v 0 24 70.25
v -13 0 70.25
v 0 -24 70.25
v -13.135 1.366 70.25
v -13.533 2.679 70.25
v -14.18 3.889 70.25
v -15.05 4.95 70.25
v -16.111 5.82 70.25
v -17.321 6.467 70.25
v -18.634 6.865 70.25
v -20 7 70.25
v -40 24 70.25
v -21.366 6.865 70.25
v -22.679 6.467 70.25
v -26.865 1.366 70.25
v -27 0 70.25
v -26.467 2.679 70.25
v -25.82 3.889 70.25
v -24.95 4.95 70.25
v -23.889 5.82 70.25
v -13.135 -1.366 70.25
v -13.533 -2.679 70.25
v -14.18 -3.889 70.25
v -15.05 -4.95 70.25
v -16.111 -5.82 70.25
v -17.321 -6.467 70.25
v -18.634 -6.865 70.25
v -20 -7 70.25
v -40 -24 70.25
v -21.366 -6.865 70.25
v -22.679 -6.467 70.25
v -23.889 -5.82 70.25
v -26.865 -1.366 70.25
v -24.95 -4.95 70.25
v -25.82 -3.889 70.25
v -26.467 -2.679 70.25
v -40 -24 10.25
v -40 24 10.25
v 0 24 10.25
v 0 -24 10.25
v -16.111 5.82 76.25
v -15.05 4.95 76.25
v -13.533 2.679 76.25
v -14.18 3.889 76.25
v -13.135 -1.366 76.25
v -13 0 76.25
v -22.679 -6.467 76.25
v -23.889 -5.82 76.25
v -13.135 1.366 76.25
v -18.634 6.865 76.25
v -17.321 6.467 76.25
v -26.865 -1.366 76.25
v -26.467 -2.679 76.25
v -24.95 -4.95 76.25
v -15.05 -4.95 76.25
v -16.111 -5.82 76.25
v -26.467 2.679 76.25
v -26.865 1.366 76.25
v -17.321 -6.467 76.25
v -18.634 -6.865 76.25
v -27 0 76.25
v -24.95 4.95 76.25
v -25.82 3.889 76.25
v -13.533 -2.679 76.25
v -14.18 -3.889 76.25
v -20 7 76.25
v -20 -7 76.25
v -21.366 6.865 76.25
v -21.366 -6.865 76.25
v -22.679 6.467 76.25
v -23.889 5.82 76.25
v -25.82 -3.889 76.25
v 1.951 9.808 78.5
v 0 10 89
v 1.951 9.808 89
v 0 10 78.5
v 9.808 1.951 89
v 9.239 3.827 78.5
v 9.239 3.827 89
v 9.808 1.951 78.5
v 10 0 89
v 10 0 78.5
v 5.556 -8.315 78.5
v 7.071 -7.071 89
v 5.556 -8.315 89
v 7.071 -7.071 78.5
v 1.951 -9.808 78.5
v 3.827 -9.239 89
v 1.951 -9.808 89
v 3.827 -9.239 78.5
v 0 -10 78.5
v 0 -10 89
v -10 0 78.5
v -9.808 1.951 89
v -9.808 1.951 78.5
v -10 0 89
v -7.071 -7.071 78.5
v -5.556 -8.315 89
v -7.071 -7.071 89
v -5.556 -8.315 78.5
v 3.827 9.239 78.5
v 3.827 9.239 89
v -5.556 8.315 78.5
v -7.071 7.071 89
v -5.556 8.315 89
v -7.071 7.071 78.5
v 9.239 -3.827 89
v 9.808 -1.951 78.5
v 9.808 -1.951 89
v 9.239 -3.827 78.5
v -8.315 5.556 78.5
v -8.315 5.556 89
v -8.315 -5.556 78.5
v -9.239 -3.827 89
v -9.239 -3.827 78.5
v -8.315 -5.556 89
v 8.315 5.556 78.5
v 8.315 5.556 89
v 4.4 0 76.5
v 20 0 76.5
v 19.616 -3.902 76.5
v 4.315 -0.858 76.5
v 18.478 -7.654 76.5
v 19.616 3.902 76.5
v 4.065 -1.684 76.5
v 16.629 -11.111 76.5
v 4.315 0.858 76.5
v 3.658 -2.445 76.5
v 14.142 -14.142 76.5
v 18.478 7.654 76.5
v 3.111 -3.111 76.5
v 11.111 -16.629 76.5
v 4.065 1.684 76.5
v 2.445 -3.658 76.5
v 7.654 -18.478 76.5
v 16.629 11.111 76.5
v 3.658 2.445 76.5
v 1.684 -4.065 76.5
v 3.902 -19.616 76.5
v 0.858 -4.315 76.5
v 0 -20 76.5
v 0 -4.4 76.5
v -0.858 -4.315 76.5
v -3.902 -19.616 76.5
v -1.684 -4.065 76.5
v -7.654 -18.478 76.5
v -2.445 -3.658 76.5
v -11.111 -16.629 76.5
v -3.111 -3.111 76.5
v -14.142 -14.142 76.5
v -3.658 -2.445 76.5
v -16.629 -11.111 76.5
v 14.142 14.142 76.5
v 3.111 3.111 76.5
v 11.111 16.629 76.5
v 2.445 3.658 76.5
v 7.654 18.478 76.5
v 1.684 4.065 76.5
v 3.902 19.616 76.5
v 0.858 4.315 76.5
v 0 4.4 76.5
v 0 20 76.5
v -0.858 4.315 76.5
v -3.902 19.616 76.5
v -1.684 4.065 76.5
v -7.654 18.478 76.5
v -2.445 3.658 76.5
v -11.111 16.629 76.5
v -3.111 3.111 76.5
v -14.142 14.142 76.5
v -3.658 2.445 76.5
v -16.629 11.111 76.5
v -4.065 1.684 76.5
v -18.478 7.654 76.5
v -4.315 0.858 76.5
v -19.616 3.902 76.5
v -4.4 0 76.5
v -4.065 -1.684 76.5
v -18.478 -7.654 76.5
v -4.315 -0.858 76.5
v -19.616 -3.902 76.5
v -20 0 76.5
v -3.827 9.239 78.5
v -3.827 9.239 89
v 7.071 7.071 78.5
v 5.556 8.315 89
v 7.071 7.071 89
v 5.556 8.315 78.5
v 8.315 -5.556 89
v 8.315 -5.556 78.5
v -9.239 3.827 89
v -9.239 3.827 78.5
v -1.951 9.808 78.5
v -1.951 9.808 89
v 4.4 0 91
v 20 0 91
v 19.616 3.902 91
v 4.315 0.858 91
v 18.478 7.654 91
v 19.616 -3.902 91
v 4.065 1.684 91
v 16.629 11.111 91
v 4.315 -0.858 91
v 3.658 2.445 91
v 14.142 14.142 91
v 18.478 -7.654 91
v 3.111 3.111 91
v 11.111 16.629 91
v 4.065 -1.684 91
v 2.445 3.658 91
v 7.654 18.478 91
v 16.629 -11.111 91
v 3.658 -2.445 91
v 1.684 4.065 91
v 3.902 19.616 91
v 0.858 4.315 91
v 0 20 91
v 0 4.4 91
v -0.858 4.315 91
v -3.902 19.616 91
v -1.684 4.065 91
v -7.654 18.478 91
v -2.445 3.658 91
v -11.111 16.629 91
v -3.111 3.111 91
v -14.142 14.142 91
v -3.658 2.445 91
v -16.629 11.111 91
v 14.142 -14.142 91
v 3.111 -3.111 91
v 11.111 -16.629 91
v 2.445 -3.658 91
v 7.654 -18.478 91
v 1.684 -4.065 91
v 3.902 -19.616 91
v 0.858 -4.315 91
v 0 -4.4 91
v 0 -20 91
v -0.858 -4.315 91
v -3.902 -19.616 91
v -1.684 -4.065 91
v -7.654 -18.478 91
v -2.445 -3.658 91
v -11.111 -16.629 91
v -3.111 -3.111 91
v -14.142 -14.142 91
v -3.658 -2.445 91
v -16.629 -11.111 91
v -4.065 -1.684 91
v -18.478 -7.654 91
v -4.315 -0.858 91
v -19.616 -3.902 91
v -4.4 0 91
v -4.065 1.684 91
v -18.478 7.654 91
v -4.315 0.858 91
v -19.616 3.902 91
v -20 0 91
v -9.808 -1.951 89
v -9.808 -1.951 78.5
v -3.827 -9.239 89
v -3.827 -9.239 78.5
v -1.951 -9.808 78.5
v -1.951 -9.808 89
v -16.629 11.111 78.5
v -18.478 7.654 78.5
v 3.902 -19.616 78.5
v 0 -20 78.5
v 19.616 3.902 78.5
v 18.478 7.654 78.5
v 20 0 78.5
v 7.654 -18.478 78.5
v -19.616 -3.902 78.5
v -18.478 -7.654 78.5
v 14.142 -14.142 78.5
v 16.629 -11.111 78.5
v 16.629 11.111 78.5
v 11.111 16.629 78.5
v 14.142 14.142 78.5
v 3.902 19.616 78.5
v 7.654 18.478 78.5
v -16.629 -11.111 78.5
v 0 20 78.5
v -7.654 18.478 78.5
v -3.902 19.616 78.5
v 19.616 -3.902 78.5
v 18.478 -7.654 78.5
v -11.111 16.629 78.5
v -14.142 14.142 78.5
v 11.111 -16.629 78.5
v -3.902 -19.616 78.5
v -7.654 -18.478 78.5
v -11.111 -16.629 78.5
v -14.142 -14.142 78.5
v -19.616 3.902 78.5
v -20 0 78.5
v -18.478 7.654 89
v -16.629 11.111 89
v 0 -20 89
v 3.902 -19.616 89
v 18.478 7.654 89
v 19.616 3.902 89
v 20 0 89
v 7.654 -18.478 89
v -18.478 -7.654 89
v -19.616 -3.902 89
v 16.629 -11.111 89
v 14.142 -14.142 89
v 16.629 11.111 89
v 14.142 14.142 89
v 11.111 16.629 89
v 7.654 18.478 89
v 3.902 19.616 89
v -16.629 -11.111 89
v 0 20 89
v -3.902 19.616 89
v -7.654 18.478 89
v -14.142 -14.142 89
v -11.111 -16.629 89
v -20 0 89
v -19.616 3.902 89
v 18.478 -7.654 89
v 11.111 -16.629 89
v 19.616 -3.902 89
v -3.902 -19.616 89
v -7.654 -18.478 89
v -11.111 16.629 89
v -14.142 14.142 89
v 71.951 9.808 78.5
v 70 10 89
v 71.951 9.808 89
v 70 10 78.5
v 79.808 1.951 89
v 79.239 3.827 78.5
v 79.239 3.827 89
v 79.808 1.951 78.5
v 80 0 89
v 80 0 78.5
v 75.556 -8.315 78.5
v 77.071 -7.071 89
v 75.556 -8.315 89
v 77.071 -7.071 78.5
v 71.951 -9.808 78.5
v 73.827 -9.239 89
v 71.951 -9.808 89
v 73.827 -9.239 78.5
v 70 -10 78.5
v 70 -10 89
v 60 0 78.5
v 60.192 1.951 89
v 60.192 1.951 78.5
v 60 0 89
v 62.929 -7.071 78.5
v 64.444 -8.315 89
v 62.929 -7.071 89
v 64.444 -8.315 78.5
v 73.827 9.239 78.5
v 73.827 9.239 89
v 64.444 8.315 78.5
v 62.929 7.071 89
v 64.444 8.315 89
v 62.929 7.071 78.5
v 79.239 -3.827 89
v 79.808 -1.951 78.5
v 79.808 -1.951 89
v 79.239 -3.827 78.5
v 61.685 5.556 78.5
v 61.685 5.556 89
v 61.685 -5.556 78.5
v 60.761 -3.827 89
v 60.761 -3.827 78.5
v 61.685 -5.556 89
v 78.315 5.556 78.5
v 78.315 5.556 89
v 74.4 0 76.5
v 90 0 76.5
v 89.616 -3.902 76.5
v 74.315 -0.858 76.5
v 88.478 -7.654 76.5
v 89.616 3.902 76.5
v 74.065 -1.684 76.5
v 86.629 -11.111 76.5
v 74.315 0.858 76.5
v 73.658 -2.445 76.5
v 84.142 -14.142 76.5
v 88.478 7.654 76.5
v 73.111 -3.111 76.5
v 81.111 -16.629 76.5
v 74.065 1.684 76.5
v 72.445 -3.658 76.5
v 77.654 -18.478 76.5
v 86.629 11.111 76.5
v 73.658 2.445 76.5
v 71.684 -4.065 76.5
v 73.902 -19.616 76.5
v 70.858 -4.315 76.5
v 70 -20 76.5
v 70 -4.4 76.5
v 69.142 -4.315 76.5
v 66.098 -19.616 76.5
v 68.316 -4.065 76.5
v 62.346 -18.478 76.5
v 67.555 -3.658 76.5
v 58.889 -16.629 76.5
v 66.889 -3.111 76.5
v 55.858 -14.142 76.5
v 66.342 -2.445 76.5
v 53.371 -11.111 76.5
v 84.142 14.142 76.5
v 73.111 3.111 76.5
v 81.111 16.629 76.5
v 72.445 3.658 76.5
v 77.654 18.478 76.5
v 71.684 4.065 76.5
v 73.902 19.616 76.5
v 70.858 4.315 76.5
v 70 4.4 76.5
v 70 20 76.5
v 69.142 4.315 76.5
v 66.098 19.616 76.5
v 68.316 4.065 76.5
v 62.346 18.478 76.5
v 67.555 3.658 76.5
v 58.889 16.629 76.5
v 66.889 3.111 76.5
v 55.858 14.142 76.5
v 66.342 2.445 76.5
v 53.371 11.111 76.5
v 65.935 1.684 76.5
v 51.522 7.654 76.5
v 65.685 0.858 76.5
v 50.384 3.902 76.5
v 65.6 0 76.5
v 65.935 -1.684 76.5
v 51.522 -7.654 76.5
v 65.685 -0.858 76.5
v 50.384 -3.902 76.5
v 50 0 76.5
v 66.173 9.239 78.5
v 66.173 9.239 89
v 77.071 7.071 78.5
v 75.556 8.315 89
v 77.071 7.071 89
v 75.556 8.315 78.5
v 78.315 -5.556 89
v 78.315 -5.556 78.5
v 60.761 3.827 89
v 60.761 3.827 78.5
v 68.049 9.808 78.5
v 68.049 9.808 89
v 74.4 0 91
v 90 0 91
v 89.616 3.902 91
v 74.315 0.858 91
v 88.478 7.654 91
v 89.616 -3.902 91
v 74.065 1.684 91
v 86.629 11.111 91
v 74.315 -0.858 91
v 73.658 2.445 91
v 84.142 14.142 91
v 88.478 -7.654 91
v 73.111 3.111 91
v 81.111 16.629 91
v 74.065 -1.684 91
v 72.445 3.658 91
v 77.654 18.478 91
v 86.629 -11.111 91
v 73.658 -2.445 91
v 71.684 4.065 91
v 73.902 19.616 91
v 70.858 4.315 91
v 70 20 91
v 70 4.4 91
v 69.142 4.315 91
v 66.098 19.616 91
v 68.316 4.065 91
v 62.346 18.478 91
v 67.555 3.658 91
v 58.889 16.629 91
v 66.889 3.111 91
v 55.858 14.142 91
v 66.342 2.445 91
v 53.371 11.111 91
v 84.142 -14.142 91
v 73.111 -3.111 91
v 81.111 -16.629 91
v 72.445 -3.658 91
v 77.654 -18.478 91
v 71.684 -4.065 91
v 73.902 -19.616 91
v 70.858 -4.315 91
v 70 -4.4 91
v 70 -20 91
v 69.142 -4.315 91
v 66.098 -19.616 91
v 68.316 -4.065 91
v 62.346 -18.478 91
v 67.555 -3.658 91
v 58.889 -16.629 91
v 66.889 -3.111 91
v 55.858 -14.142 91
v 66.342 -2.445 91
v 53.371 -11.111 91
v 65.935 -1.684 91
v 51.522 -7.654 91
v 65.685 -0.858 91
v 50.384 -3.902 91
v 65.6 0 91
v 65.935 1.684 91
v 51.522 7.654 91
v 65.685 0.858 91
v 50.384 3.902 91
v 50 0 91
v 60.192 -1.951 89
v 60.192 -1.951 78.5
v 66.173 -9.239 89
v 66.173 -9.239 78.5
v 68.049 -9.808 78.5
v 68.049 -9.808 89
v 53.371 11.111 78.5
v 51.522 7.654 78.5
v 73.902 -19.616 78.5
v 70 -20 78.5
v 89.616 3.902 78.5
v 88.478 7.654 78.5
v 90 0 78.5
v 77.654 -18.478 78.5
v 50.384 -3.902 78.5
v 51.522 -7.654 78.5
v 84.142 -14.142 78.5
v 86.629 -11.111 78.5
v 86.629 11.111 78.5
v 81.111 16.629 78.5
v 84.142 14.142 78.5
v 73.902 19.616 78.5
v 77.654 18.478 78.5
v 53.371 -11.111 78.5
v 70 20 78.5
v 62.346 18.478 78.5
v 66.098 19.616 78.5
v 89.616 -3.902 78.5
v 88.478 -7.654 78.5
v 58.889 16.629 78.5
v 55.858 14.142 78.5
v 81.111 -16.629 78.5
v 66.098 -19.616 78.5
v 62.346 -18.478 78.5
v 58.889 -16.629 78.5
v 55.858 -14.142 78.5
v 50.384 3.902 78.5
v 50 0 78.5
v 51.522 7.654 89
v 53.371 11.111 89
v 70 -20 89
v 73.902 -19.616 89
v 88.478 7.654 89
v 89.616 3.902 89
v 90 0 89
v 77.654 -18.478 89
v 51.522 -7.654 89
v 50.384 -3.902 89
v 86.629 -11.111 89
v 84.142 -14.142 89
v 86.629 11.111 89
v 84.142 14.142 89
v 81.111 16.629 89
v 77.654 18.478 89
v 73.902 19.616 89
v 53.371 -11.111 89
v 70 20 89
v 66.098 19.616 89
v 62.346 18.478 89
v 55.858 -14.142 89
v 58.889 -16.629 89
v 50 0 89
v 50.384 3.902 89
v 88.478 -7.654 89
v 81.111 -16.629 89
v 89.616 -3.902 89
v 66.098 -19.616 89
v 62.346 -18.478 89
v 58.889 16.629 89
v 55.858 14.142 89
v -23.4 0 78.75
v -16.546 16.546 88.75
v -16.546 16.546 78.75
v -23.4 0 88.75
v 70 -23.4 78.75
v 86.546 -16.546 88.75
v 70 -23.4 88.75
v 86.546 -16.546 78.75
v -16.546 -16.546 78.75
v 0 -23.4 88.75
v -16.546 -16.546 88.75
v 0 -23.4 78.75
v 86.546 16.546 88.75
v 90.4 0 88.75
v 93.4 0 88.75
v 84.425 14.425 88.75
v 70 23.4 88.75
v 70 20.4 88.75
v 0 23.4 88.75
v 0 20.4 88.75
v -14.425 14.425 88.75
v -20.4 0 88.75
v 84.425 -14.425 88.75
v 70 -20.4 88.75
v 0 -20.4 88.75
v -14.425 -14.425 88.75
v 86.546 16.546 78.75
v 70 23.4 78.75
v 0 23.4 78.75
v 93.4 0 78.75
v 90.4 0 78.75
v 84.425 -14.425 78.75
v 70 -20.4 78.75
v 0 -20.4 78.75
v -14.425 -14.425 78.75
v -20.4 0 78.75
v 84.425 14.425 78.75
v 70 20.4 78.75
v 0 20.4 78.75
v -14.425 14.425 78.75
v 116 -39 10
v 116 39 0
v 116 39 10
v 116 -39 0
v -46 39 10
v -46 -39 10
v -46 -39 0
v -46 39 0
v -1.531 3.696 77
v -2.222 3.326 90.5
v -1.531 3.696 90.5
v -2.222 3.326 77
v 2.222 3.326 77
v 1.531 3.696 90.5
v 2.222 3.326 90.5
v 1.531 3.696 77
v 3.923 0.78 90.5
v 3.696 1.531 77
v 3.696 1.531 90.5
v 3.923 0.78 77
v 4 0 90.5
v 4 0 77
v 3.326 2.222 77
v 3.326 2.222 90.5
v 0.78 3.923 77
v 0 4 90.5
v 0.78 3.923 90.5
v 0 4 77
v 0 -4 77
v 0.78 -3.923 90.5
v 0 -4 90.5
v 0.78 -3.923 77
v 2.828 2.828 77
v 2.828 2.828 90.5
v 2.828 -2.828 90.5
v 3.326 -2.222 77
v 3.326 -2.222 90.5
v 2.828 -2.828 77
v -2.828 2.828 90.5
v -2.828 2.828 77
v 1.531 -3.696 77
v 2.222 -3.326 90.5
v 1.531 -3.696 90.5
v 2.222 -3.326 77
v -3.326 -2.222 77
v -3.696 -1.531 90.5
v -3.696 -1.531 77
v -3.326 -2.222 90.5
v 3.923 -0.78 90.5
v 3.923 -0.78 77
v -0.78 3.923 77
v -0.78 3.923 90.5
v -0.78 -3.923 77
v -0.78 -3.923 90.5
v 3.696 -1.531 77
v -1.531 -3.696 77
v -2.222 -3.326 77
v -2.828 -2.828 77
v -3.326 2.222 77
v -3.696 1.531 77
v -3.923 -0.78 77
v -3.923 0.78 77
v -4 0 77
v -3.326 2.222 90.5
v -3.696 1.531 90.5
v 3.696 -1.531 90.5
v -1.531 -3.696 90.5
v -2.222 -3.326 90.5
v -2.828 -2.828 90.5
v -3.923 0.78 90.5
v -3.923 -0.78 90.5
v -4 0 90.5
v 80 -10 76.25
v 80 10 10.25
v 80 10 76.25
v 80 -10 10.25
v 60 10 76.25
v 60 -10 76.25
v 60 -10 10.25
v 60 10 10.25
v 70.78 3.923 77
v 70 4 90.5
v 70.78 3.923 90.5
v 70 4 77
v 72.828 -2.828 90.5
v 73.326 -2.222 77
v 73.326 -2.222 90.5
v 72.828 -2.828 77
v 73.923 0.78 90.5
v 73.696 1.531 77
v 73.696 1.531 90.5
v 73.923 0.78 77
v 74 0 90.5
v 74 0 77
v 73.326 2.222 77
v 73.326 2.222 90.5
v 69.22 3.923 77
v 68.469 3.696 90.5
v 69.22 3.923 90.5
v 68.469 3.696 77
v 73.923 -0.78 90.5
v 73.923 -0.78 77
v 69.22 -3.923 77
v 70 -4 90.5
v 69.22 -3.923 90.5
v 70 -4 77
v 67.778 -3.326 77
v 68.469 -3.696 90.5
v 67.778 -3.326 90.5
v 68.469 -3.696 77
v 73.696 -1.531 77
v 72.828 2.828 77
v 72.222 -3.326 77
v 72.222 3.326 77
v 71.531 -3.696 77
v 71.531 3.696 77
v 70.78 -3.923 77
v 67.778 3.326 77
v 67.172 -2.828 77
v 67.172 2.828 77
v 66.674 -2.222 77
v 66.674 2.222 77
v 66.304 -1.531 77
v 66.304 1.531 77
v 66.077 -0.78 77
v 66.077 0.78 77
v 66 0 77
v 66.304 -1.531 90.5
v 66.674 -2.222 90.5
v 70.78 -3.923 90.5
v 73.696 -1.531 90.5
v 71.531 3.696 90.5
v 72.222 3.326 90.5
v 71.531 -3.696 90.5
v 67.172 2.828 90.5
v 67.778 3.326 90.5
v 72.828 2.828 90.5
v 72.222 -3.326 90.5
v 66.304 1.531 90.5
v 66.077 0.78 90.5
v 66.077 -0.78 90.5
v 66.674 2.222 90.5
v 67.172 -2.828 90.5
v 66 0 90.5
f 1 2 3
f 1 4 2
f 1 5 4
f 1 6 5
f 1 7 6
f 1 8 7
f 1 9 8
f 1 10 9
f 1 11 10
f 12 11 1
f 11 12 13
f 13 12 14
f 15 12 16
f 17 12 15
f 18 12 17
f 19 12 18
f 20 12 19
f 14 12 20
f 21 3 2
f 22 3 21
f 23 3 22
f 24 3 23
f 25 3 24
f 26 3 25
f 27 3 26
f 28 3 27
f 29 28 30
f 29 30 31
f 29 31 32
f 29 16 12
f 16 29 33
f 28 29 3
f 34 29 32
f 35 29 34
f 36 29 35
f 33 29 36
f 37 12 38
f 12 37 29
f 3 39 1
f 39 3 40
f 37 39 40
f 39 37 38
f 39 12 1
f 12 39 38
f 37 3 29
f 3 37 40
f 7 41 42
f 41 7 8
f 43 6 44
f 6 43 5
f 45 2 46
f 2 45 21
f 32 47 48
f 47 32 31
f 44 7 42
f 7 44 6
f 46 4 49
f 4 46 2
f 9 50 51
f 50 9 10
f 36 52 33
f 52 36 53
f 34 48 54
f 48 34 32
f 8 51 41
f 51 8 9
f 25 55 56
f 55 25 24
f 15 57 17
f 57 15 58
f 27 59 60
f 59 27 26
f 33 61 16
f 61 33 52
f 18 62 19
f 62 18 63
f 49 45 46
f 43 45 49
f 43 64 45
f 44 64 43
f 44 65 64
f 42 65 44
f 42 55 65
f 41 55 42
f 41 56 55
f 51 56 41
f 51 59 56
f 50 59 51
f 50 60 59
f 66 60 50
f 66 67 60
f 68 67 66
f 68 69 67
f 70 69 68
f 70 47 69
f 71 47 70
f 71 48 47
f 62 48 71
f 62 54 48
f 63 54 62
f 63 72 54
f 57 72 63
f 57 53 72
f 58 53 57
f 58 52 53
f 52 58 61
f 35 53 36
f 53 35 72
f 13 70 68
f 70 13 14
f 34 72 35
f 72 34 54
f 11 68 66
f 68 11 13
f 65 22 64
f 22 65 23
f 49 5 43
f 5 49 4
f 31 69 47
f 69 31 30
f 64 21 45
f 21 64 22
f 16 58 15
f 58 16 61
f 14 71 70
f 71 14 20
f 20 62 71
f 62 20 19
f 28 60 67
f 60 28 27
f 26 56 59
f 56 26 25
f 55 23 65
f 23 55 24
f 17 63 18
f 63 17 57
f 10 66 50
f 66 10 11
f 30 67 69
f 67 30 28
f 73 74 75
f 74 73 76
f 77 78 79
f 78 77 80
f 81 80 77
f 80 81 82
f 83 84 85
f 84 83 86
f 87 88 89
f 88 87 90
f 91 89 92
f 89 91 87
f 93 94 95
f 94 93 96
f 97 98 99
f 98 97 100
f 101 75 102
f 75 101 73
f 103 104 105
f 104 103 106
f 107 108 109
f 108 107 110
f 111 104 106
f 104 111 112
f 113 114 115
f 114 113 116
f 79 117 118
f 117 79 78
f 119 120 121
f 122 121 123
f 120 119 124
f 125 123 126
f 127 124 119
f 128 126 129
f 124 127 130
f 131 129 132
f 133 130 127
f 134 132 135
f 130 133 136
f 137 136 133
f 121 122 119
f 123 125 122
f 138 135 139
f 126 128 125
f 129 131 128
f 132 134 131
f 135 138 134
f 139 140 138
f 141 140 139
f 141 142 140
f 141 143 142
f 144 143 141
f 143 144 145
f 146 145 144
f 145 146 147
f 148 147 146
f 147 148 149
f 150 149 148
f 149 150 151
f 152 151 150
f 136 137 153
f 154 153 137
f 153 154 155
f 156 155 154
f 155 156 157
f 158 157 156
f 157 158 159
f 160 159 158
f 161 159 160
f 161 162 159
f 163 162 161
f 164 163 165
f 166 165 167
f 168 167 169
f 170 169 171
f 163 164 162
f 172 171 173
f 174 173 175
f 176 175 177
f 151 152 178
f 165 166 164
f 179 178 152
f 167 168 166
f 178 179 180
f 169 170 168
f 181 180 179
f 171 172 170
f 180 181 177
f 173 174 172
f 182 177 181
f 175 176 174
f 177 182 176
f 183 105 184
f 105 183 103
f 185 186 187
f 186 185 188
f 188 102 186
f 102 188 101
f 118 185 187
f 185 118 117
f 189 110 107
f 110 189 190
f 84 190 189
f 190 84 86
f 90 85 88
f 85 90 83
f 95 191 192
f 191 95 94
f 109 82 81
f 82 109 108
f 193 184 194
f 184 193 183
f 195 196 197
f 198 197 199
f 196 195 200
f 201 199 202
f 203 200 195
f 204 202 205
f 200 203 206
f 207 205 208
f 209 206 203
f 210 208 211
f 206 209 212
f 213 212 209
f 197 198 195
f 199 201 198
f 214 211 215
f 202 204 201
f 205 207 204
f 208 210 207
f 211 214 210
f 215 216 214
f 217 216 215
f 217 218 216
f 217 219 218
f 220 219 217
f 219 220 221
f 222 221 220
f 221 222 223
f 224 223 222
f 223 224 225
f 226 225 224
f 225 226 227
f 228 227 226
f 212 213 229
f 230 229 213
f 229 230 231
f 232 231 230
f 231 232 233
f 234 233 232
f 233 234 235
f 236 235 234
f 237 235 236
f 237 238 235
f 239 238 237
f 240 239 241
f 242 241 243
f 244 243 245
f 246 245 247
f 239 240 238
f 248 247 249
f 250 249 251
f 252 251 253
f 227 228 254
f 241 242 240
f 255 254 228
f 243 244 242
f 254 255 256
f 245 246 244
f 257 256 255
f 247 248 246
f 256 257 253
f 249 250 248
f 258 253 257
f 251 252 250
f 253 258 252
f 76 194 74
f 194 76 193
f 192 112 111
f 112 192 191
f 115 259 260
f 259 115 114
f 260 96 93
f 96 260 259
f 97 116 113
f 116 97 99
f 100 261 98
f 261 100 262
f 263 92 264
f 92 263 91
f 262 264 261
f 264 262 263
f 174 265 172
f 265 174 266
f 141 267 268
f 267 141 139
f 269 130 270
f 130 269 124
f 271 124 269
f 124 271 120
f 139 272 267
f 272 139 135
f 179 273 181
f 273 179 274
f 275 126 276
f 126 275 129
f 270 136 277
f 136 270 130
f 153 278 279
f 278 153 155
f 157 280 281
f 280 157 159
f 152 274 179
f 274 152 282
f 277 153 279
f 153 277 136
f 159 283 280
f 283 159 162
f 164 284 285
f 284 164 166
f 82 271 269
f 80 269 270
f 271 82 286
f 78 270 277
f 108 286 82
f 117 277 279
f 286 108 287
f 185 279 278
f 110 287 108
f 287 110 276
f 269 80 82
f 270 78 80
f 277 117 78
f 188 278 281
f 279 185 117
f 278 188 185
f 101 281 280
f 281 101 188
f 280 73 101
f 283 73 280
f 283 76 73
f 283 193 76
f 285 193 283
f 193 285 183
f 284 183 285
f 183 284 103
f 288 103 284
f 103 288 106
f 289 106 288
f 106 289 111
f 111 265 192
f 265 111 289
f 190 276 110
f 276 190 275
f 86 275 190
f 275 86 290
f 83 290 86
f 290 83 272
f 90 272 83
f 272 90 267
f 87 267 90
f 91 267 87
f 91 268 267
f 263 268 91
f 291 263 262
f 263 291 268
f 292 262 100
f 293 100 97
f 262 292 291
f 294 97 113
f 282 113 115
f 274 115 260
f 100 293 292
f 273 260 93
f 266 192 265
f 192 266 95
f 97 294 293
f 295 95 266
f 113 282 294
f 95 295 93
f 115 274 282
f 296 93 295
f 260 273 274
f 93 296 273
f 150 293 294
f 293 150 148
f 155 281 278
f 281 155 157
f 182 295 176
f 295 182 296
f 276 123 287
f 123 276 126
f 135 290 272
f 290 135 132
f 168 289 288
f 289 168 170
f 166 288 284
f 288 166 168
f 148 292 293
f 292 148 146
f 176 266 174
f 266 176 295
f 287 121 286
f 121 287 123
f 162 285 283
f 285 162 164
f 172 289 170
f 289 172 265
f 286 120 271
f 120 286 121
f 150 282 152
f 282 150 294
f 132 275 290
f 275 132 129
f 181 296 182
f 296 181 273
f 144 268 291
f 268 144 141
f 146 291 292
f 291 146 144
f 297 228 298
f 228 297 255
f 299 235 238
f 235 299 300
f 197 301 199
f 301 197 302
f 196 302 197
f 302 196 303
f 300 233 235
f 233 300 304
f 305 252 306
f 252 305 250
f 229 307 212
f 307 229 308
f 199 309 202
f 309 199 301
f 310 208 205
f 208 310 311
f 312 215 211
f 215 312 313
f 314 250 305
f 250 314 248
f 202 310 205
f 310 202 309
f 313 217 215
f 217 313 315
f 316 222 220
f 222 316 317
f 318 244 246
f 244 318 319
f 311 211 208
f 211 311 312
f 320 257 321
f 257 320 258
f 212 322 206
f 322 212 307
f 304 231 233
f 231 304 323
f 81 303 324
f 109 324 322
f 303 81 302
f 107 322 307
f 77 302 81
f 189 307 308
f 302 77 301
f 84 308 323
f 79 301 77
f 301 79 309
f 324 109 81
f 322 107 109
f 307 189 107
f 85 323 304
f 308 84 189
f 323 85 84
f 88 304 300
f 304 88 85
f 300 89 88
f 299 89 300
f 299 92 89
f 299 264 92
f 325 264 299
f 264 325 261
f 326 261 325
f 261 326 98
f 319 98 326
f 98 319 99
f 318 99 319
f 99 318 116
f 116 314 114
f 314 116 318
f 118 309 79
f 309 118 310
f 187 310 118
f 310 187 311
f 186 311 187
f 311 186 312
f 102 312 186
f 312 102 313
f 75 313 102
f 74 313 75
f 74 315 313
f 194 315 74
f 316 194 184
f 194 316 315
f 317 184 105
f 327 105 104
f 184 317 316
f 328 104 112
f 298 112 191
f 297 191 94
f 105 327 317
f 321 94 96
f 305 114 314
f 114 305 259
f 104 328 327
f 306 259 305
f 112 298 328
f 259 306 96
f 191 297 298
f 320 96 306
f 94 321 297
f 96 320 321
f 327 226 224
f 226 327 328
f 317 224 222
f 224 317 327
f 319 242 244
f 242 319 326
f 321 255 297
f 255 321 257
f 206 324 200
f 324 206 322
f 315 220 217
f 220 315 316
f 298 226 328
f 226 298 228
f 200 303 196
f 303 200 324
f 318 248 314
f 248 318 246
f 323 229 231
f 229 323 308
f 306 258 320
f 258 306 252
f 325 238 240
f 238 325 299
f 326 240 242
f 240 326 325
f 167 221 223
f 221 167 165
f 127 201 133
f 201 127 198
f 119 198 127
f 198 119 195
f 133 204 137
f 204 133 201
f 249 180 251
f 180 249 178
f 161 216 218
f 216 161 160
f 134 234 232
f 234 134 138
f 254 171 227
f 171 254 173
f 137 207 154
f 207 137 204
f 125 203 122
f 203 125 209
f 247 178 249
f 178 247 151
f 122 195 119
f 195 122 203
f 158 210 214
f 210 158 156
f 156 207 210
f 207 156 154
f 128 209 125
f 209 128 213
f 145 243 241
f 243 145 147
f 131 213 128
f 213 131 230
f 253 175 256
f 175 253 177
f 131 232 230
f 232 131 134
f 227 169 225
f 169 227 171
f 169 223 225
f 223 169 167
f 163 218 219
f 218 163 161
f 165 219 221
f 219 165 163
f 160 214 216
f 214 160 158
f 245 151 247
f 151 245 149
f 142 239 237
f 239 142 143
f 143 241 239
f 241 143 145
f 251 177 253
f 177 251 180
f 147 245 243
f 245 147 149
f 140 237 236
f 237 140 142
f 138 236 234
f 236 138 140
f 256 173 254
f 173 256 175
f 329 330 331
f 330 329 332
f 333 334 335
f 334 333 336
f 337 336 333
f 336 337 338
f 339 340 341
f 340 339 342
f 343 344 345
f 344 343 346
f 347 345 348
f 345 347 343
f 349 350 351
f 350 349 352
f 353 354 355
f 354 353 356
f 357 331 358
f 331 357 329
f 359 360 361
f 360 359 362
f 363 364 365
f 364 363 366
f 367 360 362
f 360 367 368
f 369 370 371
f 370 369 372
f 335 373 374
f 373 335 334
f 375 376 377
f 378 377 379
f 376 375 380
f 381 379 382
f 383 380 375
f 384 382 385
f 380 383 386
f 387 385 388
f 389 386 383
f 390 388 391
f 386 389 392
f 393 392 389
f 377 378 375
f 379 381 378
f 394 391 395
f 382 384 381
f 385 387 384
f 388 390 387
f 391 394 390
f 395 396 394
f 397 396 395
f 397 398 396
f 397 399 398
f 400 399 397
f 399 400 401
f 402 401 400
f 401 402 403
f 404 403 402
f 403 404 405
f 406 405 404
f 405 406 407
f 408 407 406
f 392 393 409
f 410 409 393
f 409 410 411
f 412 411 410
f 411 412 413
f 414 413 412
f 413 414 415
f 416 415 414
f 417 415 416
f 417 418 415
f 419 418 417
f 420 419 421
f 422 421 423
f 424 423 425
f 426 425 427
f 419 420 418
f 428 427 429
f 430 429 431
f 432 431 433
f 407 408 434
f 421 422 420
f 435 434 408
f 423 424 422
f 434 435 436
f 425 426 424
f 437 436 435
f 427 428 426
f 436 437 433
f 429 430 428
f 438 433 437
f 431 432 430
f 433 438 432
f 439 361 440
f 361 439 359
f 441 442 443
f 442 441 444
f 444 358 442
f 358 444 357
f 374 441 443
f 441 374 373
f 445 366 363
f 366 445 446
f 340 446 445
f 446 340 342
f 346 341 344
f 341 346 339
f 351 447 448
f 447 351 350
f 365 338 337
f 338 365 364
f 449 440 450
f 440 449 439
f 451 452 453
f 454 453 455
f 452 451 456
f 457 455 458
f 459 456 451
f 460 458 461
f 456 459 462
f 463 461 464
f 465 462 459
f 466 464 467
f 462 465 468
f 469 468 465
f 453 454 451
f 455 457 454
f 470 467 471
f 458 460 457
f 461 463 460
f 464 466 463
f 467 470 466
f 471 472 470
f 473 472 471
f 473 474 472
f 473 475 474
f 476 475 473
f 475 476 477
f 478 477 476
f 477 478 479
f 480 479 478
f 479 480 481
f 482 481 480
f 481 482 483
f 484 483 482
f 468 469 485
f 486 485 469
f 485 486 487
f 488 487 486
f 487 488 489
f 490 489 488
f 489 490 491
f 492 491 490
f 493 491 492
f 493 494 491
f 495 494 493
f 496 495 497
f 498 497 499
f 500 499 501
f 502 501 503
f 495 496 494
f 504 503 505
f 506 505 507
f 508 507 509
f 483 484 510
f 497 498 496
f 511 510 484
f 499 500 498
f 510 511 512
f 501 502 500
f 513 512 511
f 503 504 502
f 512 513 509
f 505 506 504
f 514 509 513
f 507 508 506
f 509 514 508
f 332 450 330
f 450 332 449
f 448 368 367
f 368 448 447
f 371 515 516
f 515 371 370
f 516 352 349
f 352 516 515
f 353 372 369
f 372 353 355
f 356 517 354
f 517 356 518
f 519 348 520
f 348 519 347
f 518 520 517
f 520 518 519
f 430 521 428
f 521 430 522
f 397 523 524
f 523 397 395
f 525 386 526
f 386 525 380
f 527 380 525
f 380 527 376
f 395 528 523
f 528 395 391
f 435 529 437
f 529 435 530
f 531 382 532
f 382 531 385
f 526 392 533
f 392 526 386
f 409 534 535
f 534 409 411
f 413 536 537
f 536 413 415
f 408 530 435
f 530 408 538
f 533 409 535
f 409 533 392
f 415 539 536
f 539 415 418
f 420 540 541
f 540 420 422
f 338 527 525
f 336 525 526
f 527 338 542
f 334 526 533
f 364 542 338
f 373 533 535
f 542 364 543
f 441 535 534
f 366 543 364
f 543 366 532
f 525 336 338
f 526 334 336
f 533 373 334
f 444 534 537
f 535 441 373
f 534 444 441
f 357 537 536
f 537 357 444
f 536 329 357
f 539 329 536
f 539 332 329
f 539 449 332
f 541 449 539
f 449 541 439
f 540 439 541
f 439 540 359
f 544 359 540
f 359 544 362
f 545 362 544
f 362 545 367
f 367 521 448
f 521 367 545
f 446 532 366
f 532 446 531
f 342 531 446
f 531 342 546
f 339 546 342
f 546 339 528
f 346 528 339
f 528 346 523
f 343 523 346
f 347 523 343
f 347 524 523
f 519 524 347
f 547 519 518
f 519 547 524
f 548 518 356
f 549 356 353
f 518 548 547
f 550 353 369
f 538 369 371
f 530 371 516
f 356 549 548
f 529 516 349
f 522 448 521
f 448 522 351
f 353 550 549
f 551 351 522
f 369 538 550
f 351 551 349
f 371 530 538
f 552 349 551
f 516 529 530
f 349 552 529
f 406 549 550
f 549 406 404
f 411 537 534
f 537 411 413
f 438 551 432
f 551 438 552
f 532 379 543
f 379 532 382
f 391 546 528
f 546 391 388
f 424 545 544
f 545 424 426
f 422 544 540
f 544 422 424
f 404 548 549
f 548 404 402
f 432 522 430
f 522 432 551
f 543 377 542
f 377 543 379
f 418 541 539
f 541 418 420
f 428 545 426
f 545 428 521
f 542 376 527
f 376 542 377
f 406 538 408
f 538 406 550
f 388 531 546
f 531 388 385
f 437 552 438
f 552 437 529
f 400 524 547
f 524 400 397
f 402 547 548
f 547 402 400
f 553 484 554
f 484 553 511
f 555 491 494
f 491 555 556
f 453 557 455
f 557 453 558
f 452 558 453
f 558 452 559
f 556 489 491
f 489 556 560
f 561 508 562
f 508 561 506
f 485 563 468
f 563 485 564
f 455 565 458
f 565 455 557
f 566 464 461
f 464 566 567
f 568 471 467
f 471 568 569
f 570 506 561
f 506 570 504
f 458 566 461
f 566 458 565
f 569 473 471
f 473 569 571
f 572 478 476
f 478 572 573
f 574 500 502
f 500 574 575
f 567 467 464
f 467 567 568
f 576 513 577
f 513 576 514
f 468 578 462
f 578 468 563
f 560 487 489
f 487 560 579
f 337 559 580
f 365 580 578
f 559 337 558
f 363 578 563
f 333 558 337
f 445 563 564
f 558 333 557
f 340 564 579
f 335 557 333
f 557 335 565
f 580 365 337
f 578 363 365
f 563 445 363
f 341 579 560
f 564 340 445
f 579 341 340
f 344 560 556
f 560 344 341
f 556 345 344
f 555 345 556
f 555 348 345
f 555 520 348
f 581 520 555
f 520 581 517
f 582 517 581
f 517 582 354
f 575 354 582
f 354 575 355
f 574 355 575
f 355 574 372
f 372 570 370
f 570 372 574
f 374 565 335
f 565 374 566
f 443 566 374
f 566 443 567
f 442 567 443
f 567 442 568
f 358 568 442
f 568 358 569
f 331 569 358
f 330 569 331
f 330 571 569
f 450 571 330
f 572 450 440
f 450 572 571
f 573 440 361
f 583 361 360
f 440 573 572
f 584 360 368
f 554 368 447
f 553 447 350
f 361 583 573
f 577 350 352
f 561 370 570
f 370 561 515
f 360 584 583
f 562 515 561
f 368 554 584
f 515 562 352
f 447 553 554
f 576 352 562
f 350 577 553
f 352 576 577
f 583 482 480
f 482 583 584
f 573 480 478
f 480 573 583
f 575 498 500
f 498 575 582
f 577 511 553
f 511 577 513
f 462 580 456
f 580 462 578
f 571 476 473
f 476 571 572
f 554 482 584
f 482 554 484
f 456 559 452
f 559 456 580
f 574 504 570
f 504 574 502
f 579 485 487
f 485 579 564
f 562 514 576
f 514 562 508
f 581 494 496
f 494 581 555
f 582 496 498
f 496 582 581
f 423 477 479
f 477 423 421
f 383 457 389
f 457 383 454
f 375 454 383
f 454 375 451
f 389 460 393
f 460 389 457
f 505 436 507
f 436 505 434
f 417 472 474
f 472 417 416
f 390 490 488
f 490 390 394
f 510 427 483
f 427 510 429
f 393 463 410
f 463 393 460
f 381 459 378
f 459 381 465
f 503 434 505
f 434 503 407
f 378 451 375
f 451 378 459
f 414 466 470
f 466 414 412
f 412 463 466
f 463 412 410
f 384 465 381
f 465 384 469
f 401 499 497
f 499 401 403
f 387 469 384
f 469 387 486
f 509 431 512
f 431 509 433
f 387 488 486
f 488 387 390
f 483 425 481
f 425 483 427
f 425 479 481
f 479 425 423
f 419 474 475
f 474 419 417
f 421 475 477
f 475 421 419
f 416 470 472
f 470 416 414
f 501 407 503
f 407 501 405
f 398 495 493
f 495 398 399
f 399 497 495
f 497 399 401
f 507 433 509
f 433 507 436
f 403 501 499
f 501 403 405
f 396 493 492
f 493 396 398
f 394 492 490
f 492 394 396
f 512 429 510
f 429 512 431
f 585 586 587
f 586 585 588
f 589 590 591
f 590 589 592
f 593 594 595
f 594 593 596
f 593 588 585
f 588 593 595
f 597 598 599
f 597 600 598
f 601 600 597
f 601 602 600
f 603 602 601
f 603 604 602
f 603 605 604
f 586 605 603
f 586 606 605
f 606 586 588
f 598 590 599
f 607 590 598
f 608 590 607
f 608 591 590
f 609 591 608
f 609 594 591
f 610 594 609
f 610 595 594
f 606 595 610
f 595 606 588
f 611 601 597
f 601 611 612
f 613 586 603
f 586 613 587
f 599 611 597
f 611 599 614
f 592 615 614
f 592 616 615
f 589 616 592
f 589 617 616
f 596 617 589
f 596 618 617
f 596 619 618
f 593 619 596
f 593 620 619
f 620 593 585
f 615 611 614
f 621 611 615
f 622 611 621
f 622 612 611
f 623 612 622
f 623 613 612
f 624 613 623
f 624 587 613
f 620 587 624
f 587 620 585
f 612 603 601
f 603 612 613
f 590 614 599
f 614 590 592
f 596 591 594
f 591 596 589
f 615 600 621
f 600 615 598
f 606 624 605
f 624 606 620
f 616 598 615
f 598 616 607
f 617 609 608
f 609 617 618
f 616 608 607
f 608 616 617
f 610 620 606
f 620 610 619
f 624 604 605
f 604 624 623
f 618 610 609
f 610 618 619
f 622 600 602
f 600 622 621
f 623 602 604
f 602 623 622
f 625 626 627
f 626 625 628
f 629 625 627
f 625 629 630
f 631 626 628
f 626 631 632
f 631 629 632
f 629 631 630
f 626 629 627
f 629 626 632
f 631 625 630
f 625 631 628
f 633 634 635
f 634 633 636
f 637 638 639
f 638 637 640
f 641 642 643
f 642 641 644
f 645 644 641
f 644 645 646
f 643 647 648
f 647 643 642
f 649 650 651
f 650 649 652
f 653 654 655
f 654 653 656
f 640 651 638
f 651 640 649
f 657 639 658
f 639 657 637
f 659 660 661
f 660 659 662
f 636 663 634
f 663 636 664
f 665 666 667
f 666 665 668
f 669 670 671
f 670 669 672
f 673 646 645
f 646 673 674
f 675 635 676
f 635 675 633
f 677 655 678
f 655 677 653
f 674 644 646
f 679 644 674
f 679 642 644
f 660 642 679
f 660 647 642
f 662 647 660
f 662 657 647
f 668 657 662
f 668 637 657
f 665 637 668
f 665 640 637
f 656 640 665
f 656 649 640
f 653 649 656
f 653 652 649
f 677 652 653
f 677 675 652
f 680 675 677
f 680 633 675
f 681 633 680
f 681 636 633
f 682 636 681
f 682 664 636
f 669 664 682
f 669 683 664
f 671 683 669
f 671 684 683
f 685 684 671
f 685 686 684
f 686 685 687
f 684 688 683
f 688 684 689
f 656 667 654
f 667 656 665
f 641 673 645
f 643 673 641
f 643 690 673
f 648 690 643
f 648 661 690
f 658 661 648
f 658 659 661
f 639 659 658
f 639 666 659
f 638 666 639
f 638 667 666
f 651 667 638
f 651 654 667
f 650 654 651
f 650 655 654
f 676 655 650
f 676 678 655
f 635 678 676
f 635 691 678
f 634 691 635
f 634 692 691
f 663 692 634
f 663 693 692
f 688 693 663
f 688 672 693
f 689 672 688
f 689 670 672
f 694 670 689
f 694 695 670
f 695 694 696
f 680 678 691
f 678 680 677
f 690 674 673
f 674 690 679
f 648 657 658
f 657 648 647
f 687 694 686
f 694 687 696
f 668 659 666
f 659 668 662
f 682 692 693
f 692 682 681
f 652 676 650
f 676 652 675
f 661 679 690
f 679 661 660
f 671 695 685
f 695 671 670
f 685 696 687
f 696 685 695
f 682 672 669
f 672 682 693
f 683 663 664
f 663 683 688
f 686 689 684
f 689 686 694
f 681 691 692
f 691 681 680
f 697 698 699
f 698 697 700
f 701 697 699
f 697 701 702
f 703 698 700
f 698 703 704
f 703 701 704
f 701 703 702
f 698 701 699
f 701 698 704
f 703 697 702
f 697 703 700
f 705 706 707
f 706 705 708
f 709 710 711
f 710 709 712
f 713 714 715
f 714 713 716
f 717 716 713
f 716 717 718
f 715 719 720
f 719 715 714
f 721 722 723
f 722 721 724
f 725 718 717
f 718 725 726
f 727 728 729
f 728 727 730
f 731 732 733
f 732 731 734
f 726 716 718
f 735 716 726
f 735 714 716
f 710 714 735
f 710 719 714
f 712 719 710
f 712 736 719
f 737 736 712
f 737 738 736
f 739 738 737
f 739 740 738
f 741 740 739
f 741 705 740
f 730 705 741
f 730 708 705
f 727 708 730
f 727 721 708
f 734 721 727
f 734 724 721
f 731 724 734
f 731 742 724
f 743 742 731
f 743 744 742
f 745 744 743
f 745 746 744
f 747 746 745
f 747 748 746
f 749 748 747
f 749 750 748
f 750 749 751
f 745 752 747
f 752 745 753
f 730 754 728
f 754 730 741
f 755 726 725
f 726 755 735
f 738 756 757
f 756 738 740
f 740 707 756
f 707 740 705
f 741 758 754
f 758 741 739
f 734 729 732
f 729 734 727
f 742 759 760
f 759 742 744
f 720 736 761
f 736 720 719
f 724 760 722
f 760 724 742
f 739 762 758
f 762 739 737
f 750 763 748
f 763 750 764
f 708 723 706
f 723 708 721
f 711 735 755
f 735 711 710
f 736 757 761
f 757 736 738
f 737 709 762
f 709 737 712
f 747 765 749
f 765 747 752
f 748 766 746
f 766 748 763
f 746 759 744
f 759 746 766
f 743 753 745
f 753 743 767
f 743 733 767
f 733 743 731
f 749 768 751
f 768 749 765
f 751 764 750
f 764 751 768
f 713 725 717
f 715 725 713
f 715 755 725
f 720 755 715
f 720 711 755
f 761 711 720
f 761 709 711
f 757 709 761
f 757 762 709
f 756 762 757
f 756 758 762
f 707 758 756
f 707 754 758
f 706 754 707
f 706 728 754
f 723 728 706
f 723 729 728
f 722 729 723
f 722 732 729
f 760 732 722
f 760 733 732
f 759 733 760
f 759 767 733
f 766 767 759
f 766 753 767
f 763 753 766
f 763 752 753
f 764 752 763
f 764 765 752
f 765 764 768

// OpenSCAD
$fn = 32;

// ------------------------------------------------------------------------
// Motor belt drive: span 70 mm, pulleys d40, belt 10 mm wide
// Every part is its own module, assembly() places every instance.
// ------------------------------------------------------------------------

// --- part 1 ---
module base_plate() {
  difference() {
    translate([-81, -39, 0]) cube([162, 78, 10]);
  }
}

// --- part 2 ---
module motor() {
  union() {
    translate([-30, -24, 0]) cube([60, 48, 40]);
    translate([33, 0, 20]) rotate([0, 90, 0]) cylinder(h = 6, d = 14, center = true);
  }
}

// --- part 3 ---
module drive_shaft() {
  translate([0, 0, -6.75]) cylinder(h = 13.5, d = 8);
}

// --- part 4 ---
module pulley_drive() {
  difference() {
    union() {
      cylinder(h = 14.5, d = 20);
      cylinder(h = 2, d = 40);
      translate([0, 0, 12.5]) cylinder(h = 2, d = 40);
    }
    translate([0, 0, -1]) cylinder(h = 16.5, d = 8.8);
  }
}

// --- part 5 ---
module idler_post() {
  translate([-10, -10, 0]) cube([20, 20, 66]);
}

// --- part 6 ---
module driven_shaft() {
  translate([0, 0, -6.75]) cylinder(h = 13.5, d = 8);
}

// --- part 7 ---
module pulley_driven() {
  difference() {
    union() {
      cylinder(h = 14.5, d = 20);
      cylinder(h = 2, d = 40);
      translate([0, 0, 12.5]) cylinder(h = 2, d = 40);
    }
    translate([0, 0, -1]) cylinder(h = 16.5, d = 8.8);
  }
}

// --- part 8 ---
module drive_belt() {
  difference() {
    linear_extrude(height = 10) polygon(points = concat([for (a = [90 : 45 : 270]) [23.4 * cos(a), 23.4 * sin(a)]], [for (a = [270 : 45 : 450]) [70 + 23.4 * cos(a), 23.4 * sin(a)]]));
    translate([0, 0, -1]) linear_extrude(height = 12) polygon(points = concat([for (a = [90 : 45 : 270]) [20.4 * cos(a), 20.4 * sin(a)]], [for (a = [270 : 45 : 450]) [70 + 20.4 * cos(a), 20.4 * sin(a)]]));
  }
}

// --- assembly ---
module assembly() {
  color([0.80, 0.24, 0.20]) translate([35, 0, 0]) rotate([0, 0, 0]) base_plate();
  color([0.20, 0.45, 0.75]) translate([0, 0, 40.25]) rotate([0, 270, 0]) motor();
  color([0.25, 0.62, 0.32]) translate([0, 0, 83.75]) rotate([0, 0, 0]) drive_shaft();
  color([0.92, 0.70, 0.18]) translate([0, 0, 76.5]) rotate([0, 0, 0]) pulley_drive();
  color([0.58, 0.35, 0.70]) translate([70, 0, 10.25]) rotate([0, 0, 0]) idler_post();
  color([0.16, 0.66, 0.66]) translate([70, 0, 83.75]) rotate([0, 0, 0]) driven_shaft();
  color([0.85, 0.48, 0.18]) translate([70, 0, 76.5]) rotate([0, 0, 0]) pulley_driven();
  color([0.55, 0.60, 0.65]) translate([0, 0, 78.75]) rotate([0, 0, 0]) drive_belt();
}

assembly();
